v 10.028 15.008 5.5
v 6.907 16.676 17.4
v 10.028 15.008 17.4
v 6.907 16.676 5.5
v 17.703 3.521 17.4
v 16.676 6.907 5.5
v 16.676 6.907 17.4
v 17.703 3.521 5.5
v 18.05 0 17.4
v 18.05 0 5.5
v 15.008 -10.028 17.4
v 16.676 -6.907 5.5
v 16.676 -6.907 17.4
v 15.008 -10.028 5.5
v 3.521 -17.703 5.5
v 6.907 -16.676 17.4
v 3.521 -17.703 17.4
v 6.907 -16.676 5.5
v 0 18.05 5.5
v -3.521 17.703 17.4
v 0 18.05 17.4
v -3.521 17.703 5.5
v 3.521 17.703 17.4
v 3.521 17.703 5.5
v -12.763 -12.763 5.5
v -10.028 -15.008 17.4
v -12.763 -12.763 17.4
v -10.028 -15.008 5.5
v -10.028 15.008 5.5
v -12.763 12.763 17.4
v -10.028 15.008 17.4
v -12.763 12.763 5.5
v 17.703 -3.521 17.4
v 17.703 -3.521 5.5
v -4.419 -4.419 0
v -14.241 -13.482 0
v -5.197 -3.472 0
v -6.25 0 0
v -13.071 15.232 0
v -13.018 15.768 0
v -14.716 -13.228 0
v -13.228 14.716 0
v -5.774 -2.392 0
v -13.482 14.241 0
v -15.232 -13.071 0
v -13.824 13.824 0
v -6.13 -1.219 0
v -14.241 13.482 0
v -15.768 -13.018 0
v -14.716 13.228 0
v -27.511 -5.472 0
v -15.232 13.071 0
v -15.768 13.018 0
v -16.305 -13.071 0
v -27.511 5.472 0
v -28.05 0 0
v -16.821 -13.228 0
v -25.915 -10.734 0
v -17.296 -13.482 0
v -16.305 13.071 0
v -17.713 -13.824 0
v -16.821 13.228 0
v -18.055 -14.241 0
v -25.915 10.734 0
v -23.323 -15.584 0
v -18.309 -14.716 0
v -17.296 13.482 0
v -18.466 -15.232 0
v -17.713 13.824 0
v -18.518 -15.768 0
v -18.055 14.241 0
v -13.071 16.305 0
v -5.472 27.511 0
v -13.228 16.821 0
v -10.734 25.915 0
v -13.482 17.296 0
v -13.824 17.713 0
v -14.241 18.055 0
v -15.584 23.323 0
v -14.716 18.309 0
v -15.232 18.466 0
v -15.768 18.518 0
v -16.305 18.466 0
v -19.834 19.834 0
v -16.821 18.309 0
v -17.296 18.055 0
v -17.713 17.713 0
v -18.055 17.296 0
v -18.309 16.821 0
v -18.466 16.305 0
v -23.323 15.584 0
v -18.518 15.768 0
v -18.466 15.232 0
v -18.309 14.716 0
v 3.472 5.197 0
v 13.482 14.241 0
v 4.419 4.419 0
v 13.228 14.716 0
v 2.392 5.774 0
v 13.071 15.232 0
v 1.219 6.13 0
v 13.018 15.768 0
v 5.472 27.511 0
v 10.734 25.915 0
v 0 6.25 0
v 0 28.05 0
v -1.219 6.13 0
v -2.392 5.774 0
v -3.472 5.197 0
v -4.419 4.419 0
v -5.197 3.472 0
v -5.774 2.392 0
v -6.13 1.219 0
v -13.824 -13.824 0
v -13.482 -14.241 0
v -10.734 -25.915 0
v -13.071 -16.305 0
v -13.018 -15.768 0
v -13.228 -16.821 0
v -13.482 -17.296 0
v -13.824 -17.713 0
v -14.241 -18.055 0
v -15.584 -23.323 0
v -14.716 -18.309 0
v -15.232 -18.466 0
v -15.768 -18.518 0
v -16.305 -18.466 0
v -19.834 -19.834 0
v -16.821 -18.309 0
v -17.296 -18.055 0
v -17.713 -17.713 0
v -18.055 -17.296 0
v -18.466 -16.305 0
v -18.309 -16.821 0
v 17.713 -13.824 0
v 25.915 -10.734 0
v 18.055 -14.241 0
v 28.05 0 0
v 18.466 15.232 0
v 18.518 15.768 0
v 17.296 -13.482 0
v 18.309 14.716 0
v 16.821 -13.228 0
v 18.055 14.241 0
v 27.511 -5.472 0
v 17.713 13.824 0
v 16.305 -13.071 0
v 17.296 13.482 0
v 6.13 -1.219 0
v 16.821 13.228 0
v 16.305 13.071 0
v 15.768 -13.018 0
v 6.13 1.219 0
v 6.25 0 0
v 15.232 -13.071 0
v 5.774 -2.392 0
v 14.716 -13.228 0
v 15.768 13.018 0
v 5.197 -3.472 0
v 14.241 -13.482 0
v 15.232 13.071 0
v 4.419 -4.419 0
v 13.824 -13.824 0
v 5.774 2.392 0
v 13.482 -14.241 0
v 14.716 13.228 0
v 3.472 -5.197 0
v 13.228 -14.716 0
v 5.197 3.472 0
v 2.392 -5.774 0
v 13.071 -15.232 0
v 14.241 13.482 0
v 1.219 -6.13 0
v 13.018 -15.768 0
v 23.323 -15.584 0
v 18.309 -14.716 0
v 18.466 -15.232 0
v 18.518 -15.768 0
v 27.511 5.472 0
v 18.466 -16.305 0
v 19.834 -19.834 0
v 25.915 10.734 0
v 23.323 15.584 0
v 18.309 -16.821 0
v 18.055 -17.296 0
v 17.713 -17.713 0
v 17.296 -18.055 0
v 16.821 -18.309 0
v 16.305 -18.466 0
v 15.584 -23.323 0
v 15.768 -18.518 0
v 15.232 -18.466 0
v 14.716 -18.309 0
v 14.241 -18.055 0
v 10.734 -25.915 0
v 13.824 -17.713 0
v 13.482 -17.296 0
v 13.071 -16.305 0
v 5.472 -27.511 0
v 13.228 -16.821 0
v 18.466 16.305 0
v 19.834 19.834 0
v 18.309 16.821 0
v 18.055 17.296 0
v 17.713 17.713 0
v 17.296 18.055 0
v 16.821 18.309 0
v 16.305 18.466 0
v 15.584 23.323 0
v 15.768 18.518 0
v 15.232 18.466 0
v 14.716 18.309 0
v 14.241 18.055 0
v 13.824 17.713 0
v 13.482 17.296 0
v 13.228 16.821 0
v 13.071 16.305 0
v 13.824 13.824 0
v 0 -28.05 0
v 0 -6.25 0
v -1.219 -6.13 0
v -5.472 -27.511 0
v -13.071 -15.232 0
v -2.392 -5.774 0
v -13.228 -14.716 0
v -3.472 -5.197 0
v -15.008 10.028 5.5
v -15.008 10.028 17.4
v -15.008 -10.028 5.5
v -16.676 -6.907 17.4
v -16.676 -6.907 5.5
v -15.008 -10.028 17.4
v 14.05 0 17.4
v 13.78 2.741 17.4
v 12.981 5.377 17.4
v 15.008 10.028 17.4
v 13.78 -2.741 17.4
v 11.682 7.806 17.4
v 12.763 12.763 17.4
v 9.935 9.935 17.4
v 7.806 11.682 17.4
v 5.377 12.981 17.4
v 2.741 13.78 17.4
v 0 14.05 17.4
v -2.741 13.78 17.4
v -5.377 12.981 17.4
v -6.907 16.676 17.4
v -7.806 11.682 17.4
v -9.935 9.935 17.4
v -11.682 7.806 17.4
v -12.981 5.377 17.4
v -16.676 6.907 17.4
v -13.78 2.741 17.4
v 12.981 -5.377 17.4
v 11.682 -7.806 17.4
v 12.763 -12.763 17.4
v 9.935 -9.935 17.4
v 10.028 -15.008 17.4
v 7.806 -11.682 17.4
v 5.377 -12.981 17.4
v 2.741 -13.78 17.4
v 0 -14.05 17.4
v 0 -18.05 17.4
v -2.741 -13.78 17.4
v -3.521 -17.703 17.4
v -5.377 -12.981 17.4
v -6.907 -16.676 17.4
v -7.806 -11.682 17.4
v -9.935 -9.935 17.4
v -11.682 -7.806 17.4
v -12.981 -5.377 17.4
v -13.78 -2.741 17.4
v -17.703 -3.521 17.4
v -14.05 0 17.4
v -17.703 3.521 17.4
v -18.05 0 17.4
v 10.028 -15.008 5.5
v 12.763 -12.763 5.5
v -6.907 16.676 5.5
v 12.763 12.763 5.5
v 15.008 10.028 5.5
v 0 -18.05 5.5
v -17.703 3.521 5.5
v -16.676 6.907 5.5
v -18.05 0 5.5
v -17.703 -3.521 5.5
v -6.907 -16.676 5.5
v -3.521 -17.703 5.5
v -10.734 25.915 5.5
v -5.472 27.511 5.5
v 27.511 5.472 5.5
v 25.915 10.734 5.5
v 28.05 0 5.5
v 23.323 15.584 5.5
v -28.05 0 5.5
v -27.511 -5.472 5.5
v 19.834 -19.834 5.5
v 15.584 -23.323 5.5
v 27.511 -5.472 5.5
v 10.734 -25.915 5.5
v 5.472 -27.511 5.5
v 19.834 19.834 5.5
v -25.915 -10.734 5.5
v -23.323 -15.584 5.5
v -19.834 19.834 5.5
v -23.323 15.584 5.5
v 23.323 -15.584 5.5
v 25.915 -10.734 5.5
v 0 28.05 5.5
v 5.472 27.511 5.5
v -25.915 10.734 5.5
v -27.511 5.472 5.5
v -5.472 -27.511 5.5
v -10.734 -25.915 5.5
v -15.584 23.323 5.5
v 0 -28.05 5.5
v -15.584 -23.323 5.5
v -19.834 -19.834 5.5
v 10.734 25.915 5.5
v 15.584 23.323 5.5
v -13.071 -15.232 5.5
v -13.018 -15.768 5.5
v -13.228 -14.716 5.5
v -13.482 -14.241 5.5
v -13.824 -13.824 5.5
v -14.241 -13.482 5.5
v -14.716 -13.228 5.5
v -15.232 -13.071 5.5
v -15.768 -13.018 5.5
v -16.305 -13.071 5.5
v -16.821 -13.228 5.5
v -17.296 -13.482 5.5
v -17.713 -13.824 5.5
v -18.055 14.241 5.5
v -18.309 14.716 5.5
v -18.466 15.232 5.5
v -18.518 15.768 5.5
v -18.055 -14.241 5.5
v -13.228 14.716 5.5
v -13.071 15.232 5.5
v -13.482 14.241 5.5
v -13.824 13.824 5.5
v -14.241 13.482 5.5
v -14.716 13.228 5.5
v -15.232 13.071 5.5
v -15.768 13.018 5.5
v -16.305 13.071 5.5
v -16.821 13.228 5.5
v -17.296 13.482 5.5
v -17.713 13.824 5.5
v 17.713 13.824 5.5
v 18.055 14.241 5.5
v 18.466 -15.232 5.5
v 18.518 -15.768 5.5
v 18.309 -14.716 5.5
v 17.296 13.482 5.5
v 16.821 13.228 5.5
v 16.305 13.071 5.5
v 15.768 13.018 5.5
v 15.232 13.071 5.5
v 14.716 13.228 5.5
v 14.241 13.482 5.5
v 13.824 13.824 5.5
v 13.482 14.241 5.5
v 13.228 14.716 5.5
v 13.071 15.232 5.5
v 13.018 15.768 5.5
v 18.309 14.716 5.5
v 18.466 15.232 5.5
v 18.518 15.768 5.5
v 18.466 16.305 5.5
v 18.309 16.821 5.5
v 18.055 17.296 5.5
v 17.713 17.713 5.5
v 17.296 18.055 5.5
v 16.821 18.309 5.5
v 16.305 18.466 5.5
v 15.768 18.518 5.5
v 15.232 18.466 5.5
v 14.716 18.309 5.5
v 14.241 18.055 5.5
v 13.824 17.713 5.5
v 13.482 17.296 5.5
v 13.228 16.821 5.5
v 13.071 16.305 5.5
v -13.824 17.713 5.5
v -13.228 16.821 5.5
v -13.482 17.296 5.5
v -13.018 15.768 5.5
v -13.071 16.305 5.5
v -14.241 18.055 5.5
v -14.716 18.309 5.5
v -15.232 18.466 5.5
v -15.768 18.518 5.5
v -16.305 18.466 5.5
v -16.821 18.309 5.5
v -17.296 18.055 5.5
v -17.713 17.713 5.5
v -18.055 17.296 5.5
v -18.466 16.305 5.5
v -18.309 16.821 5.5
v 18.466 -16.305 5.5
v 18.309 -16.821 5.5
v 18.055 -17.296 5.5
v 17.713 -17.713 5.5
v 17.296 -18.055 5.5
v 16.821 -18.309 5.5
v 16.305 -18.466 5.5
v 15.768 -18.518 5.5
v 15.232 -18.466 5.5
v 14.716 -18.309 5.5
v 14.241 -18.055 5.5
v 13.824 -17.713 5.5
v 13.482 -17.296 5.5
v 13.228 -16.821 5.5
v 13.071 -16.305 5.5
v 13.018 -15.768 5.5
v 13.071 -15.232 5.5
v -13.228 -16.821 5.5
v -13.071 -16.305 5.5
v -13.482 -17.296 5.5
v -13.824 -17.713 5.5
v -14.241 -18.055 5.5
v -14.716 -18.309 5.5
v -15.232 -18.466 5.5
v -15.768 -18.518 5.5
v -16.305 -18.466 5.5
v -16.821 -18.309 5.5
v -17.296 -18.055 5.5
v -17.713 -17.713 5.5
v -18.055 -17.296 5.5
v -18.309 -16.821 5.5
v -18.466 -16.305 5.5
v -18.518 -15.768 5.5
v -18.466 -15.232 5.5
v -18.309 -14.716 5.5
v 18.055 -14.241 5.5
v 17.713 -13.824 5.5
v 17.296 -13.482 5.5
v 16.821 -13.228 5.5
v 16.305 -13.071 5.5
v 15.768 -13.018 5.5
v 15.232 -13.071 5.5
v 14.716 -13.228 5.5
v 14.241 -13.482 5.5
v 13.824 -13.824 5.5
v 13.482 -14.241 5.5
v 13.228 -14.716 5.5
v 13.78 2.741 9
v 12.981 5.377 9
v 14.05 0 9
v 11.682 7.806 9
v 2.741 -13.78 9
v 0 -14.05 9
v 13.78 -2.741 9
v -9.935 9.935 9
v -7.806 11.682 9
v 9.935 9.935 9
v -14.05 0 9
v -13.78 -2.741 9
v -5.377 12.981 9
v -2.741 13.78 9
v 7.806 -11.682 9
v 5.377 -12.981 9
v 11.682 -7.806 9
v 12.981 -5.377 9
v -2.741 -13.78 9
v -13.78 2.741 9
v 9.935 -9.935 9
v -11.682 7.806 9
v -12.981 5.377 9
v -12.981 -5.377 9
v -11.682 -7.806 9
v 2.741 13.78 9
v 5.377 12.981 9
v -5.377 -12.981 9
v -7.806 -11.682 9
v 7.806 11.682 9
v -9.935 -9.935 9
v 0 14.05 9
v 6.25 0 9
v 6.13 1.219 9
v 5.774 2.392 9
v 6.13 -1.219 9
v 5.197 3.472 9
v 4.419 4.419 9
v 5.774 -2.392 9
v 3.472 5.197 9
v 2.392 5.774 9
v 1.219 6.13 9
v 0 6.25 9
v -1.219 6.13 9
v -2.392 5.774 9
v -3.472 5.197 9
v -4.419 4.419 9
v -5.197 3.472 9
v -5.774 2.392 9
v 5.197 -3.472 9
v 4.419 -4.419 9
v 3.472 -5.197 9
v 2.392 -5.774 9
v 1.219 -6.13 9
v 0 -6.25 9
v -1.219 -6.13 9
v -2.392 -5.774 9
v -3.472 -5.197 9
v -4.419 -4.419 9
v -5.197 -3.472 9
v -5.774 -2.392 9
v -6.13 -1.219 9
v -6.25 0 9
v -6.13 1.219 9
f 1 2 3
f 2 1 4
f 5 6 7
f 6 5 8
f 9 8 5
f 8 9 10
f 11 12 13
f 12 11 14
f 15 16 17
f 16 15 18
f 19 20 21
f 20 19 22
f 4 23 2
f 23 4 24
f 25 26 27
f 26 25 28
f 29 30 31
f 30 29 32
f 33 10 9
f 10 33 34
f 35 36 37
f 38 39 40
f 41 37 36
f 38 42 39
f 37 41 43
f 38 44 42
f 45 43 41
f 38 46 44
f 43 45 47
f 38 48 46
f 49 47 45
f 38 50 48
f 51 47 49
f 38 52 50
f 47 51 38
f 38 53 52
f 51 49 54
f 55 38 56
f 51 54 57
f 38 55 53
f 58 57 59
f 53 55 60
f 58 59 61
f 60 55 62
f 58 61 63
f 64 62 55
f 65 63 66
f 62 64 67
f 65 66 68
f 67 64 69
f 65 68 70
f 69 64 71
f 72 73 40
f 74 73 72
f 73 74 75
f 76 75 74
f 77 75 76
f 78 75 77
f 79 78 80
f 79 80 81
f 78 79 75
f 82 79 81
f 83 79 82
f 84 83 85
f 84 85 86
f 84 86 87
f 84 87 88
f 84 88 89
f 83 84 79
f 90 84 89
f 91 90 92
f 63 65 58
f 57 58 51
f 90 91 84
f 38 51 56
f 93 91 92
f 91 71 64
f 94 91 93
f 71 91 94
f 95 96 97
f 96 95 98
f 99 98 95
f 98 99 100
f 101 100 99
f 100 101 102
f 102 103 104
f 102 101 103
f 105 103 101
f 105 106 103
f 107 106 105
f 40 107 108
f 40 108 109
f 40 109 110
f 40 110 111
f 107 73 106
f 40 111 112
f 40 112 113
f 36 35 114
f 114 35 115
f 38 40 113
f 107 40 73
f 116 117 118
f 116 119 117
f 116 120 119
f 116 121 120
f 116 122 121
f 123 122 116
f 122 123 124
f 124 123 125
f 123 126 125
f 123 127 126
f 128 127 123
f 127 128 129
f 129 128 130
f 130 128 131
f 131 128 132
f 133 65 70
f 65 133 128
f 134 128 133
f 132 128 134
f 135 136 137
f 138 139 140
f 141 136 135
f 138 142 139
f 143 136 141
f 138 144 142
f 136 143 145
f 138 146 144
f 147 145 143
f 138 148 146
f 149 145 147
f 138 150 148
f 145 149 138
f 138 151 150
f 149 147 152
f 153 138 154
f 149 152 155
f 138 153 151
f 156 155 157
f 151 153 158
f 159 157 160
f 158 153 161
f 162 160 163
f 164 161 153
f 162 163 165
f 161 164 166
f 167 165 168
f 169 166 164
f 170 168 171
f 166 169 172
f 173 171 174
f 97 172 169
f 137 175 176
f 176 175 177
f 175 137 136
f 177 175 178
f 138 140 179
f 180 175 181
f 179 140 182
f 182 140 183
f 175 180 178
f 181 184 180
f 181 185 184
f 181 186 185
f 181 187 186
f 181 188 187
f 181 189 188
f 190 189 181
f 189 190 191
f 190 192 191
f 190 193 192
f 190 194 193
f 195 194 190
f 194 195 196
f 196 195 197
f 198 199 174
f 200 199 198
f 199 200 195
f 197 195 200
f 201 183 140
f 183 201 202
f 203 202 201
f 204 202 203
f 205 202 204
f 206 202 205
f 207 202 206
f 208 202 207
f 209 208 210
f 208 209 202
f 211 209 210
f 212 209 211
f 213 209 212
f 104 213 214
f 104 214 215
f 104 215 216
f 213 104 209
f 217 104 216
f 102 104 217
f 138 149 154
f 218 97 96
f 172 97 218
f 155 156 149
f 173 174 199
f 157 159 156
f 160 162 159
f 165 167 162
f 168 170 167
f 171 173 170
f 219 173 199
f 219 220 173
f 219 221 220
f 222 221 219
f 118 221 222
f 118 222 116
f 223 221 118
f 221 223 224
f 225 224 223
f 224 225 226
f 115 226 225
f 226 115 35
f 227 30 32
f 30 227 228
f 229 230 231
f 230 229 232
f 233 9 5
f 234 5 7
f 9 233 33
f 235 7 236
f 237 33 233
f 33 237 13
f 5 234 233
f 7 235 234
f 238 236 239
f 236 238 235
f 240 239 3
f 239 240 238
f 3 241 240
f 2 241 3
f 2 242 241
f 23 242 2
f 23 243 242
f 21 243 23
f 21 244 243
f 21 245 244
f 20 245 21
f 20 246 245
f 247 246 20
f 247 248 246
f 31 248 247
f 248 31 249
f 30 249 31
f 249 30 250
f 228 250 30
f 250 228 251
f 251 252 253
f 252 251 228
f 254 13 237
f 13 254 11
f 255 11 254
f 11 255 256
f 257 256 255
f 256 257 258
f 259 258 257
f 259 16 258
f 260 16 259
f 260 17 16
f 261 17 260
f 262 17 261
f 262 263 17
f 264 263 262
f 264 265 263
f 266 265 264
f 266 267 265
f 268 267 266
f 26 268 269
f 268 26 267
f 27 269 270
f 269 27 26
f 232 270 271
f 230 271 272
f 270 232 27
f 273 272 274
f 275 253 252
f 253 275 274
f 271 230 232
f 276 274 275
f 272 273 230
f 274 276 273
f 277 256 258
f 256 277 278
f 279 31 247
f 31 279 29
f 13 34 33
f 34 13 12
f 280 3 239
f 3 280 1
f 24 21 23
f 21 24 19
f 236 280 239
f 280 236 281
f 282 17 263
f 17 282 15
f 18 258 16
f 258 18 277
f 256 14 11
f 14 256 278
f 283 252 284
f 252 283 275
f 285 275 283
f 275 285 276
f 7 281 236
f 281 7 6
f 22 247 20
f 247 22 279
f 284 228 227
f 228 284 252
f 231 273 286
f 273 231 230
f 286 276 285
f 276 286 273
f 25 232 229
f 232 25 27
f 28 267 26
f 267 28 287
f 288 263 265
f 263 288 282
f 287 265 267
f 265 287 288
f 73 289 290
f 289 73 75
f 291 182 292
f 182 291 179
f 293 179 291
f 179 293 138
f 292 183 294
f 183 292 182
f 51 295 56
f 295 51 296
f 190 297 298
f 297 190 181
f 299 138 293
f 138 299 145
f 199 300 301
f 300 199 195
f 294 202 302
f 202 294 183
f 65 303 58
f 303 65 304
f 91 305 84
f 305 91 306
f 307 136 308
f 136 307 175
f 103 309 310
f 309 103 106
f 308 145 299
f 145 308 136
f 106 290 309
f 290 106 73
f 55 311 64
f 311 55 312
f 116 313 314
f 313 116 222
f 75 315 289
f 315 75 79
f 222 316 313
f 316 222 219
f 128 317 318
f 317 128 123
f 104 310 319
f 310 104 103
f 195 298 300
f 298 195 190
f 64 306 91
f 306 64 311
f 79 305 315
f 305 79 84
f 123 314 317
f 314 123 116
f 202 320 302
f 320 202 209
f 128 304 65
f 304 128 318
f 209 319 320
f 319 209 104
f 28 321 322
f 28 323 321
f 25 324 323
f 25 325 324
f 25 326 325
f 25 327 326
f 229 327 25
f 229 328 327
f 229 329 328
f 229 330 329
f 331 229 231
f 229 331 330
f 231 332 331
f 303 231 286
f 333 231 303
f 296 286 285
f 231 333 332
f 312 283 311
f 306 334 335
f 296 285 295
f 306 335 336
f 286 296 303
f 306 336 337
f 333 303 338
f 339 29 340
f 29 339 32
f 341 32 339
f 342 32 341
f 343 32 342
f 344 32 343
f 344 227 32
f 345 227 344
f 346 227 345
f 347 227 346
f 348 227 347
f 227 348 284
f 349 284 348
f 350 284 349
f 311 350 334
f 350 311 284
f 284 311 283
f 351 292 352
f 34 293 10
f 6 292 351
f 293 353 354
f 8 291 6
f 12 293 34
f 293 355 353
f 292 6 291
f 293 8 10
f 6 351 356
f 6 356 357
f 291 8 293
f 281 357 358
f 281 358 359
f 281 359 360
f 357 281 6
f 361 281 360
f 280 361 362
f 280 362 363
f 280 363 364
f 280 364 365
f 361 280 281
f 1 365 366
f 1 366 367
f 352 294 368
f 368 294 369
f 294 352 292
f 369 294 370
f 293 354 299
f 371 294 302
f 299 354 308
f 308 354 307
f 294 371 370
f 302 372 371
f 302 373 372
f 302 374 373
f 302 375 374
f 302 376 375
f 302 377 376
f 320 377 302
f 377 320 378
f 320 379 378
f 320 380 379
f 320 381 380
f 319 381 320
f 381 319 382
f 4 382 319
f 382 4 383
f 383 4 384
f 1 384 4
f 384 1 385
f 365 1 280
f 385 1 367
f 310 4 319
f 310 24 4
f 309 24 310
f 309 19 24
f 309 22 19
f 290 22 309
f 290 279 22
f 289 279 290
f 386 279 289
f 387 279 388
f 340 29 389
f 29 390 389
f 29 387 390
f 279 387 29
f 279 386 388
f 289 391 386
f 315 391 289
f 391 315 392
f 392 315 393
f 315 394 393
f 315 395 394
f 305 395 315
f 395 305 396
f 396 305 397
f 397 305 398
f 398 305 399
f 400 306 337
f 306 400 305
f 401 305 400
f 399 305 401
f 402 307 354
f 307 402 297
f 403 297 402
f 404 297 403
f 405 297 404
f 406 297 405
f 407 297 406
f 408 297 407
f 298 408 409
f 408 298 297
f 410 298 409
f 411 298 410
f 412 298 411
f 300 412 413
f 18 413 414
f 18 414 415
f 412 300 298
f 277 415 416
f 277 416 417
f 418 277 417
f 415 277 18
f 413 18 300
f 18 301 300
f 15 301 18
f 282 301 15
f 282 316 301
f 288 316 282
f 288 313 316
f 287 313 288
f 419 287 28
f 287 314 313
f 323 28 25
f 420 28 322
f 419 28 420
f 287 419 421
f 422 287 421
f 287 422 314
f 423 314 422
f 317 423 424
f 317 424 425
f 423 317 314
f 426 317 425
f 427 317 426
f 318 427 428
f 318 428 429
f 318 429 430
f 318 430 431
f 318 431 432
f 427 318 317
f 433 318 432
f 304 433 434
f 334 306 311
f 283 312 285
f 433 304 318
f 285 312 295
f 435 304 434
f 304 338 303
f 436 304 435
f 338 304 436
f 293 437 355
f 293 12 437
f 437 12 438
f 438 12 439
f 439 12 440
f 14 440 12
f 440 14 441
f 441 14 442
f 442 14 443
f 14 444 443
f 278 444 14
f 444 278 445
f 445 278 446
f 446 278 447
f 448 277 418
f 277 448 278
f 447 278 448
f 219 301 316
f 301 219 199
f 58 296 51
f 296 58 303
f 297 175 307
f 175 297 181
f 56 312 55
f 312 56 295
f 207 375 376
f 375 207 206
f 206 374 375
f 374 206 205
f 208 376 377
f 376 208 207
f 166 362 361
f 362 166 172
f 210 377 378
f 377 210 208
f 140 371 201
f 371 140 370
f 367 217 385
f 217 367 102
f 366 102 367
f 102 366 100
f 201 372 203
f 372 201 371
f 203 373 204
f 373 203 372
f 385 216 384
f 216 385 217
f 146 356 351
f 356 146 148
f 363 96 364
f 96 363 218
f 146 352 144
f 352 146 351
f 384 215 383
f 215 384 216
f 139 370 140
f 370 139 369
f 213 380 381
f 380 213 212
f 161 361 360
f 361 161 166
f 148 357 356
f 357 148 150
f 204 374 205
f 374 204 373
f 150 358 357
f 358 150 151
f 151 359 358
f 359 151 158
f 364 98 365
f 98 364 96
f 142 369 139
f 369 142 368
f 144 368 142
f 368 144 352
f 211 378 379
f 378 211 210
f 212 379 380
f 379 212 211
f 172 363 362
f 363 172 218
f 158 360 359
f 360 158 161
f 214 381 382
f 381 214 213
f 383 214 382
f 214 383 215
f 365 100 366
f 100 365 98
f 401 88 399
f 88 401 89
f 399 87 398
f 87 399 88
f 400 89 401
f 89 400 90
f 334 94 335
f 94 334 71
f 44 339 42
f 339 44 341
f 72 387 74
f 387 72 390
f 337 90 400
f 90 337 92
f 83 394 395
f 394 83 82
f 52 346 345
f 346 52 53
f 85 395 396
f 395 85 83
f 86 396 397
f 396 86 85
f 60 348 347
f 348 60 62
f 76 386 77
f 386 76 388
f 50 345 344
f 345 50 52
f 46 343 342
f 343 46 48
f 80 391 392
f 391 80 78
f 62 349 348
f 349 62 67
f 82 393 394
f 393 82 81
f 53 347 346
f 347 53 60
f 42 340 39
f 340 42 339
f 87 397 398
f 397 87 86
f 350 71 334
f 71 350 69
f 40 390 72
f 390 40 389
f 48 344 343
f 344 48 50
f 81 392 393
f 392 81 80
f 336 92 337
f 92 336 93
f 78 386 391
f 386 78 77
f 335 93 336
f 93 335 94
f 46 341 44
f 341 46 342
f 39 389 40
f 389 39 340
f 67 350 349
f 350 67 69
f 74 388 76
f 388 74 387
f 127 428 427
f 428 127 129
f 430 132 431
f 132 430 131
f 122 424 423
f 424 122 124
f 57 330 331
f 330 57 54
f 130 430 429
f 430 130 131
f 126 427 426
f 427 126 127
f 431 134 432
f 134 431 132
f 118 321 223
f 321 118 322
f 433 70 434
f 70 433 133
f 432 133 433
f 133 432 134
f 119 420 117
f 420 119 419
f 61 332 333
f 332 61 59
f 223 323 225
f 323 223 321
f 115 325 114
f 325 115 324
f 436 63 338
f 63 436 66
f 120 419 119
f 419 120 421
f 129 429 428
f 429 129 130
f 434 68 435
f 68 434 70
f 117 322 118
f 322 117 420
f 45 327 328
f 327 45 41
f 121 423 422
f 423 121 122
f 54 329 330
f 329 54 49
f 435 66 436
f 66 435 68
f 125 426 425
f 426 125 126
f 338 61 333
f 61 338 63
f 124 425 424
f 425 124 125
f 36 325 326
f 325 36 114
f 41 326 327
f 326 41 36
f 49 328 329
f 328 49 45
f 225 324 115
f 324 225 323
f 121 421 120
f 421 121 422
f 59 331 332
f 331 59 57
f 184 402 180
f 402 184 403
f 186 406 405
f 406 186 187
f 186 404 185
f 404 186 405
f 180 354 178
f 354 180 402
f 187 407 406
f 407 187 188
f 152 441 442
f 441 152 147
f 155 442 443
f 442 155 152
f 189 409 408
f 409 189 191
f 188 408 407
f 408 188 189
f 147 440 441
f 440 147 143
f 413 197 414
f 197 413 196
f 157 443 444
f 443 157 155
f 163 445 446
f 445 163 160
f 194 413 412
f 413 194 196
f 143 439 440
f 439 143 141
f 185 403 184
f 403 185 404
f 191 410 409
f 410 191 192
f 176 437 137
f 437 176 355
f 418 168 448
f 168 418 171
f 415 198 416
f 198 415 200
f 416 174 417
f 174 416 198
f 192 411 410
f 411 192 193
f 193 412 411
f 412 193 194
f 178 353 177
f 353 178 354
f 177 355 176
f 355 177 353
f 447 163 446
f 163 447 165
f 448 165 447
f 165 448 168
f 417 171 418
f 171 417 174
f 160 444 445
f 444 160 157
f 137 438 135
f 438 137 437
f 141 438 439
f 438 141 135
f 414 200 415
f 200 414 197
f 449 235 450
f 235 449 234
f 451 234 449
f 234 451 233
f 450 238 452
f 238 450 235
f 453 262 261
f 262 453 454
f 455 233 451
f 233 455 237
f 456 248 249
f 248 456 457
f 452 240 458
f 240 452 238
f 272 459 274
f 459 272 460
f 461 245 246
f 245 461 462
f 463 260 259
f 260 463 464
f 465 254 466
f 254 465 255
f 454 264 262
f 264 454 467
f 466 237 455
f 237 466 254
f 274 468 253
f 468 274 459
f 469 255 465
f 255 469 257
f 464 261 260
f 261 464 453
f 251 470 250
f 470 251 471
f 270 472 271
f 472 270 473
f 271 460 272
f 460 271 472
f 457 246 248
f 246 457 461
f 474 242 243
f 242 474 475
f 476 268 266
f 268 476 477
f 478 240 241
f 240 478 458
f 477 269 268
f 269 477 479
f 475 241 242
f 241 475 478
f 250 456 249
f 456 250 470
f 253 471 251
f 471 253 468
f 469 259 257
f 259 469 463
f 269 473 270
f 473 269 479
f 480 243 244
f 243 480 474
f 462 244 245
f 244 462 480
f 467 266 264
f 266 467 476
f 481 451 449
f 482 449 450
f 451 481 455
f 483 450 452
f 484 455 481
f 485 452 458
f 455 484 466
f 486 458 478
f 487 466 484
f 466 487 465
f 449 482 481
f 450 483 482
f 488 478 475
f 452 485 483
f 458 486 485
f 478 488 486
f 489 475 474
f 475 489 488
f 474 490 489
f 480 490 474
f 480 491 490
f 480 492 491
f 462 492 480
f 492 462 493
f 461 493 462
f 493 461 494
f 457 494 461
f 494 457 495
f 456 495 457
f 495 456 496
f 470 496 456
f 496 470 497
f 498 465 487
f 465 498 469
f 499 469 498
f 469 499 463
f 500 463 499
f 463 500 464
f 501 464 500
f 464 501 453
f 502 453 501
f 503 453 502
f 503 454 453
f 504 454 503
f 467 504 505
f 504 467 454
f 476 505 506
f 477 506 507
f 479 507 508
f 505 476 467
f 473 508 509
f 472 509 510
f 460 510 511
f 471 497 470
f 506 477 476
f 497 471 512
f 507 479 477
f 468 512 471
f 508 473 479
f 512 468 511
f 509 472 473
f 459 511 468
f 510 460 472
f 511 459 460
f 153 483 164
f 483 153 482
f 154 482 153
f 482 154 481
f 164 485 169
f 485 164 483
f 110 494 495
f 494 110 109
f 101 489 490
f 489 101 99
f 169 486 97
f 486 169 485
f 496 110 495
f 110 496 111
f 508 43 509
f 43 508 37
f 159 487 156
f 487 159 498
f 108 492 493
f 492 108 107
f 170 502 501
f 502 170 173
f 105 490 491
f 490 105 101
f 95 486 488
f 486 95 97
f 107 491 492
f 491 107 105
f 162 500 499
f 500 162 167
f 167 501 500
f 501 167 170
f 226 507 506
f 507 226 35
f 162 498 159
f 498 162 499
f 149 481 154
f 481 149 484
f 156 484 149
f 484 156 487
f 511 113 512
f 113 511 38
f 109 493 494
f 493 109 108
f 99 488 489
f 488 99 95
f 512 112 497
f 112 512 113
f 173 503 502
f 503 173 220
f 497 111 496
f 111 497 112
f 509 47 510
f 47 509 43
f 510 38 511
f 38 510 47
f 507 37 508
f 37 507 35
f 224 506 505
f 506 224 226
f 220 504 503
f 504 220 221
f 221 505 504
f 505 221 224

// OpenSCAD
$fn = 32;

// ----------------------------------------------------------------------
// Bearing housing: seat for 6001 (28 x 8 mm), 36.1 mm body
// ----------------------------------------------------------------------

// --- parameters (mm) ---
case_d = 36.1;            // housing outside diameter
case_h = 17.4;            // overall housing height
rim_t = 4;                // wall thickness
bearing_seat = 28.1;      // 6001 seat, 0.1 mm clearance
seat_h = 8.4;             // pocket depth
shoulder = 5;             // shoulder under the bearing
pass_d = 12.5;            // shaft passage
ear_d = 56.1;             // mounting flange diameter
flange_t = 4;             // flange thickness
bolt_d = 5.5;             // flange bolt clearance
bolt_r = 22.3;            // flange bolt circle radius

module body() {
  cylinder(h = case_h, d = case_d);
}

module flange() {
  /* flange sunk 1.5 mm into the body */
  cylinder(h = flange_t + 1.5, d = ear_d);
}

difference() {
  union() {
    body();
    flange();
  }
  translate([0, 0, case_h - seat_h]) cylinder(h = seat_h + 1, d = bearing_seat);
  translate([0, 0, -1]) cylinder(h = case_h - seat_h + 1, d = pass_d);
  for (i = [0 : 3]) rotate([0, 0, 45 + i * 90]) translate([bolt_r, 0, -1])
    cylinder(h = flange_t + 3, d = bolt_d);
}
